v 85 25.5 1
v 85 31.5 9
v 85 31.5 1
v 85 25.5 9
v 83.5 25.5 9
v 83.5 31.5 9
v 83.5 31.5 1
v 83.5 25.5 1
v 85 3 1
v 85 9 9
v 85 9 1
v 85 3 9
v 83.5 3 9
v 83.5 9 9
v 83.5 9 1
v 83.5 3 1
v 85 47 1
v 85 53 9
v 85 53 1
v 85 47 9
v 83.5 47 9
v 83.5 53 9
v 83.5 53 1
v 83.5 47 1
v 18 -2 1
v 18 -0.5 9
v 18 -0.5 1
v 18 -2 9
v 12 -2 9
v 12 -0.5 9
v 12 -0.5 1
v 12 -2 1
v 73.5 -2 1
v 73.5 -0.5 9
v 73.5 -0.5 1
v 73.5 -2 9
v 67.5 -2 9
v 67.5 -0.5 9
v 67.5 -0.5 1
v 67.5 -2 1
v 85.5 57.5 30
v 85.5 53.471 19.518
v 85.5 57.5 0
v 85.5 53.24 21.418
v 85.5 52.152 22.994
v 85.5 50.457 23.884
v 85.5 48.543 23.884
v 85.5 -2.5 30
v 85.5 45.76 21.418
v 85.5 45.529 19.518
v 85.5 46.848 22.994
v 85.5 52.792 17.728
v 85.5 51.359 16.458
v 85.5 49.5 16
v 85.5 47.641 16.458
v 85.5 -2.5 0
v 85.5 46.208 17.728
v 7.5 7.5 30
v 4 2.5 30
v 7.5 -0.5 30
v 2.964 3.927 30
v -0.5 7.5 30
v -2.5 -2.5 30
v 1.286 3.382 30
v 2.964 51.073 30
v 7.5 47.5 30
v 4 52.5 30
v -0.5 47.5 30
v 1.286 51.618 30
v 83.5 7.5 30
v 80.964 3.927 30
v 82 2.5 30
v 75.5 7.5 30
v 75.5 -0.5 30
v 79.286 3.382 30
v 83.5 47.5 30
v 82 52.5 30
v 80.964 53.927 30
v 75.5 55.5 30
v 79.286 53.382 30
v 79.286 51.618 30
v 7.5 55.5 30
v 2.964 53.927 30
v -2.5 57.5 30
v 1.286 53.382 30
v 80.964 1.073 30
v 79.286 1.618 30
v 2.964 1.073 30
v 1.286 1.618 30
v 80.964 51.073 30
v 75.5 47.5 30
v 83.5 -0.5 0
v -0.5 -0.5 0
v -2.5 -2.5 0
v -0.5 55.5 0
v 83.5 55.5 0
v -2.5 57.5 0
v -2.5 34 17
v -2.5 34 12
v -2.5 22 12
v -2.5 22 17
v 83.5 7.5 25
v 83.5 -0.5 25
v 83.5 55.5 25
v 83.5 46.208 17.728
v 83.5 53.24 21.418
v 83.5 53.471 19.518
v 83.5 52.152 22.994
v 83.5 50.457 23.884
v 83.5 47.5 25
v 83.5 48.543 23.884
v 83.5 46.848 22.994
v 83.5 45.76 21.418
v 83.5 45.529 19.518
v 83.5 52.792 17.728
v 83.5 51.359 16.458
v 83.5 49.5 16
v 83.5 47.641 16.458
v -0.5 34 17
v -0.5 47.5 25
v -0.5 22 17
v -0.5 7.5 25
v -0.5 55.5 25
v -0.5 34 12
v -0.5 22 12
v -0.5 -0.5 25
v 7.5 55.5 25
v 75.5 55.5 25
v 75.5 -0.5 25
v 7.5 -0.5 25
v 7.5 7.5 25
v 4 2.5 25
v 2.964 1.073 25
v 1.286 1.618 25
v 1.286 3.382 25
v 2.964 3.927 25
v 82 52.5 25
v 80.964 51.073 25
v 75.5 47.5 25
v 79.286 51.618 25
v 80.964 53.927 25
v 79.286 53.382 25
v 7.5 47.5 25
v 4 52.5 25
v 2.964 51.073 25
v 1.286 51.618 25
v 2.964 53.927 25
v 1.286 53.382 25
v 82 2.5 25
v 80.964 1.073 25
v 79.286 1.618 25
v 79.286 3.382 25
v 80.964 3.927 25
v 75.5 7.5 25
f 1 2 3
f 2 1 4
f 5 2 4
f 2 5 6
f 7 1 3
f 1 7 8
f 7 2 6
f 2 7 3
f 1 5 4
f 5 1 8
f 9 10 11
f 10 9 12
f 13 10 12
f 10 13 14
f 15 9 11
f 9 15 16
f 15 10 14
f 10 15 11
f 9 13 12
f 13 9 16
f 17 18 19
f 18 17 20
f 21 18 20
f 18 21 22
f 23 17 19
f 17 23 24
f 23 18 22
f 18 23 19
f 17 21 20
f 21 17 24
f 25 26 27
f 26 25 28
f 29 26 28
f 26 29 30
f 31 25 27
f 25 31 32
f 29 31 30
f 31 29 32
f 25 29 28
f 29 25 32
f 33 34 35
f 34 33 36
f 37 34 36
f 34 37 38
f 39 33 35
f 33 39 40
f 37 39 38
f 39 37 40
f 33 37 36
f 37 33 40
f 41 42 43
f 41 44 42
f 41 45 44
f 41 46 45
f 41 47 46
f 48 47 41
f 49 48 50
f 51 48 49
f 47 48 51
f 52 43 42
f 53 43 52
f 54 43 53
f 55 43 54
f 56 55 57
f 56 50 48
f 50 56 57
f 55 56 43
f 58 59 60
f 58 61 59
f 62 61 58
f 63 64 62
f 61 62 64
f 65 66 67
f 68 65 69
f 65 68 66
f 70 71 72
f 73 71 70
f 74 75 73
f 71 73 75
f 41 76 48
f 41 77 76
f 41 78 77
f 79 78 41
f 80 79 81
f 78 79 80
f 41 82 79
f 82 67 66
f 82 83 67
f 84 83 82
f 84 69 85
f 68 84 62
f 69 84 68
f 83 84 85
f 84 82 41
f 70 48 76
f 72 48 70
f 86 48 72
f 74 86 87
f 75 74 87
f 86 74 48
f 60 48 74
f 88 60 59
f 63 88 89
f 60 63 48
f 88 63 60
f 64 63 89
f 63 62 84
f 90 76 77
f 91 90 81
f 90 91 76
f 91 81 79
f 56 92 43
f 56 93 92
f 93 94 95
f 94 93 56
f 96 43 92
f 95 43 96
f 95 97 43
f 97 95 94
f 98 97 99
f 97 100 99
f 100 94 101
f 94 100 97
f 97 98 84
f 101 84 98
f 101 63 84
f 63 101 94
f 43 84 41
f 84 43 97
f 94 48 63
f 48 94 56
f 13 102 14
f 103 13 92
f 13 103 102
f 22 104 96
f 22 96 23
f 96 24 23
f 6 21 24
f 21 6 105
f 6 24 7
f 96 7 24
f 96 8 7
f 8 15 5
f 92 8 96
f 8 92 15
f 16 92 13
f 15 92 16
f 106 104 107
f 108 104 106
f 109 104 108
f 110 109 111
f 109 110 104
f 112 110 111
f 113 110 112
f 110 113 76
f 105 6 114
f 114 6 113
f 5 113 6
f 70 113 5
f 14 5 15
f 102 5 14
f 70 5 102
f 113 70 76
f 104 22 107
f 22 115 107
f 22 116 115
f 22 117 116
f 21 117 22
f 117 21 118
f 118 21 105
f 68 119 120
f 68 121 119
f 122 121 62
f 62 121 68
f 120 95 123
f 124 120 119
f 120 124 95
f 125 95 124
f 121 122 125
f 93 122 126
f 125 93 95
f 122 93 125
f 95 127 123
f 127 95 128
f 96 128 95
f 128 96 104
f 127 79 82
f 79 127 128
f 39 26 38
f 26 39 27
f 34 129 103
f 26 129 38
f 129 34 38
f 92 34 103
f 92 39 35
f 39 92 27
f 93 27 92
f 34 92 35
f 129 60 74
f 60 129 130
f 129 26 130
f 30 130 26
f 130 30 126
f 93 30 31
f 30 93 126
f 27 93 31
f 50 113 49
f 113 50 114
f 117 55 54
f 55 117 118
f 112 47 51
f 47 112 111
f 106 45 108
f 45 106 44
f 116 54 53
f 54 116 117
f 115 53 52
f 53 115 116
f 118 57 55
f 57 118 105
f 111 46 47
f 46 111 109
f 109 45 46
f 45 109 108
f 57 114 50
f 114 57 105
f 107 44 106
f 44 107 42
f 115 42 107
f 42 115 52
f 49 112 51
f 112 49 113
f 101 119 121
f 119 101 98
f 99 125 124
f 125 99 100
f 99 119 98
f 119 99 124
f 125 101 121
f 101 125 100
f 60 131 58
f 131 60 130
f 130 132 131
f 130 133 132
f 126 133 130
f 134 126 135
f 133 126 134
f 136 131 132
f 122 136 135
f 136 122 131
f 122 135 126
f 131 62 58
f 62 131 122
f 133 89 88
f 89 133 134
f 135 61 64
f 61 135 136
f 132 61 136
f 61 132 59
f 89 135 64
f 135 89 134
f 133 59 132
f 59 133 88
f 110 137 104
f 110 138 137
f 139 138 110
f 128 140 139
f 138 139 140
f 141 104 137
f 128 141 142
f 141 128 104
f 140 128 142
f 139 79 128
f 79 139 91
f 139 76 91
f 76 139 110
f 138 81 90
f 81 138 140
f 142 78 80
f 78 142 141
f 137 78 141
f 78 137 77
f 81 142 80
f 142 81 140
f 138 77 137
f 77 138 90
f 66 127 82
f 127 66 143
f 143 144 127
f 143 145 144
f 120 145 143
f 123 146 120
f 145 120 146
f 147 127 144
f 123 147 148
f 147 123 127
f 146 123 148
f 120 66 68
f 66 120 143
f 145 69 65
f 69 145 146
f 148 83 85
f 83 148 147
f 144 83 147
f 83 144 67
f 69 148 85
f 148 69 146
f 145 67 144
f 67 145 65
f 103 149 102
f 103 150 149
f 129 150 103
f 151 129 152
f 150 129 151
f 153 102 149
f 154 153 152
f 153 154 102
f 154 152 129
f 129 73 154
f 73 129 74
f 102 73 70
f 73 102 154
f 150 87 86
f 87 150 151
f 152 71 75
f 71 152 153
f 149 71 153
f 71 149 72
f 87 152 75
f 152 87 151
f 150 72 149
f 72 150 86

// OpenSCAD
// Breadboard Box


box = true;
breadboard = false;
deckel = false;

bbL = 83;
bbB = 55;
bbH = 10;

boxH = 30;

if (box) box();
if (breadboard) breadboard();
if (deckel) deckel();

module breadboard() {
    color("white")
    union() {
        cube([bbL,bbB,bbH]);

        translate([bbL,bbB/2-2,1])
        cube([2,6,8]);

        translate([bbL,3,1])
        cube([2,6,8]);

        translate([bbL,bbB-3-5,1])
        cube([2,6,8]);

        translate([12,-2,1])
        cube([6,2,8]);

        translate([bbL-12-3.5,-2,1])
        cube([6,2,8]);
    }
}


module box(){
    
    translate([-2.5,-2.5,0])
    difference(){
        cube([bbL+5,bbB+5,boxH]);
        translate([2.0,2.0,-2.5])
        cube([bbL+1,bbB+1,boxH+5]);
        translate([2.5,2.5,0])
        breadboard();
        
        // Stromanschluss
        rotate([0,90,0])
        translate([-14-6,54-2,2+bbL])
        cylinder(d=8,h=5);
        
        // USB-Anschluss
        translate([-2,bbB/2-6/2,12])
        cube([5,12,5]);
    }
    
    nut();
    translate([bbL-5,bbB-5,0])
    nut();
    translate([0,bbB-5,0])
    nut();
    translate([bbL-5,0,0])
    nut();
}

module nut() {
    
    translate([-2.5,-2.5,25])
    difference() {
        cube([10,10,5]);
        translate([5,5,-1])
        cylinder(d=3,h=7);
    }
}

module deckel() {
    rotate([180,0,0])
    translate([0,-55,-30])
    color("orange")
    translate([-6,-6,-5])
    difference() {
        cube([bbL+12,bbB+12,10]);
        translate([2,2,5])
        cube([bbL+8,bbB+8,10]);
        
        translate([8.5,8.5,-1])
        cylinder(d=3,h=10);

        translate([bbL+12-8.5,8.5,-1])
        cylinder(d=3,h=10);

        translate([8.5,bbB+12-8.5,-1])
        cylinder(d=3,h=10);

        translate([bbL+12-8.5,bbB+12-8.5,-1])
        cylinder(d=3,h=10);
    }
}
